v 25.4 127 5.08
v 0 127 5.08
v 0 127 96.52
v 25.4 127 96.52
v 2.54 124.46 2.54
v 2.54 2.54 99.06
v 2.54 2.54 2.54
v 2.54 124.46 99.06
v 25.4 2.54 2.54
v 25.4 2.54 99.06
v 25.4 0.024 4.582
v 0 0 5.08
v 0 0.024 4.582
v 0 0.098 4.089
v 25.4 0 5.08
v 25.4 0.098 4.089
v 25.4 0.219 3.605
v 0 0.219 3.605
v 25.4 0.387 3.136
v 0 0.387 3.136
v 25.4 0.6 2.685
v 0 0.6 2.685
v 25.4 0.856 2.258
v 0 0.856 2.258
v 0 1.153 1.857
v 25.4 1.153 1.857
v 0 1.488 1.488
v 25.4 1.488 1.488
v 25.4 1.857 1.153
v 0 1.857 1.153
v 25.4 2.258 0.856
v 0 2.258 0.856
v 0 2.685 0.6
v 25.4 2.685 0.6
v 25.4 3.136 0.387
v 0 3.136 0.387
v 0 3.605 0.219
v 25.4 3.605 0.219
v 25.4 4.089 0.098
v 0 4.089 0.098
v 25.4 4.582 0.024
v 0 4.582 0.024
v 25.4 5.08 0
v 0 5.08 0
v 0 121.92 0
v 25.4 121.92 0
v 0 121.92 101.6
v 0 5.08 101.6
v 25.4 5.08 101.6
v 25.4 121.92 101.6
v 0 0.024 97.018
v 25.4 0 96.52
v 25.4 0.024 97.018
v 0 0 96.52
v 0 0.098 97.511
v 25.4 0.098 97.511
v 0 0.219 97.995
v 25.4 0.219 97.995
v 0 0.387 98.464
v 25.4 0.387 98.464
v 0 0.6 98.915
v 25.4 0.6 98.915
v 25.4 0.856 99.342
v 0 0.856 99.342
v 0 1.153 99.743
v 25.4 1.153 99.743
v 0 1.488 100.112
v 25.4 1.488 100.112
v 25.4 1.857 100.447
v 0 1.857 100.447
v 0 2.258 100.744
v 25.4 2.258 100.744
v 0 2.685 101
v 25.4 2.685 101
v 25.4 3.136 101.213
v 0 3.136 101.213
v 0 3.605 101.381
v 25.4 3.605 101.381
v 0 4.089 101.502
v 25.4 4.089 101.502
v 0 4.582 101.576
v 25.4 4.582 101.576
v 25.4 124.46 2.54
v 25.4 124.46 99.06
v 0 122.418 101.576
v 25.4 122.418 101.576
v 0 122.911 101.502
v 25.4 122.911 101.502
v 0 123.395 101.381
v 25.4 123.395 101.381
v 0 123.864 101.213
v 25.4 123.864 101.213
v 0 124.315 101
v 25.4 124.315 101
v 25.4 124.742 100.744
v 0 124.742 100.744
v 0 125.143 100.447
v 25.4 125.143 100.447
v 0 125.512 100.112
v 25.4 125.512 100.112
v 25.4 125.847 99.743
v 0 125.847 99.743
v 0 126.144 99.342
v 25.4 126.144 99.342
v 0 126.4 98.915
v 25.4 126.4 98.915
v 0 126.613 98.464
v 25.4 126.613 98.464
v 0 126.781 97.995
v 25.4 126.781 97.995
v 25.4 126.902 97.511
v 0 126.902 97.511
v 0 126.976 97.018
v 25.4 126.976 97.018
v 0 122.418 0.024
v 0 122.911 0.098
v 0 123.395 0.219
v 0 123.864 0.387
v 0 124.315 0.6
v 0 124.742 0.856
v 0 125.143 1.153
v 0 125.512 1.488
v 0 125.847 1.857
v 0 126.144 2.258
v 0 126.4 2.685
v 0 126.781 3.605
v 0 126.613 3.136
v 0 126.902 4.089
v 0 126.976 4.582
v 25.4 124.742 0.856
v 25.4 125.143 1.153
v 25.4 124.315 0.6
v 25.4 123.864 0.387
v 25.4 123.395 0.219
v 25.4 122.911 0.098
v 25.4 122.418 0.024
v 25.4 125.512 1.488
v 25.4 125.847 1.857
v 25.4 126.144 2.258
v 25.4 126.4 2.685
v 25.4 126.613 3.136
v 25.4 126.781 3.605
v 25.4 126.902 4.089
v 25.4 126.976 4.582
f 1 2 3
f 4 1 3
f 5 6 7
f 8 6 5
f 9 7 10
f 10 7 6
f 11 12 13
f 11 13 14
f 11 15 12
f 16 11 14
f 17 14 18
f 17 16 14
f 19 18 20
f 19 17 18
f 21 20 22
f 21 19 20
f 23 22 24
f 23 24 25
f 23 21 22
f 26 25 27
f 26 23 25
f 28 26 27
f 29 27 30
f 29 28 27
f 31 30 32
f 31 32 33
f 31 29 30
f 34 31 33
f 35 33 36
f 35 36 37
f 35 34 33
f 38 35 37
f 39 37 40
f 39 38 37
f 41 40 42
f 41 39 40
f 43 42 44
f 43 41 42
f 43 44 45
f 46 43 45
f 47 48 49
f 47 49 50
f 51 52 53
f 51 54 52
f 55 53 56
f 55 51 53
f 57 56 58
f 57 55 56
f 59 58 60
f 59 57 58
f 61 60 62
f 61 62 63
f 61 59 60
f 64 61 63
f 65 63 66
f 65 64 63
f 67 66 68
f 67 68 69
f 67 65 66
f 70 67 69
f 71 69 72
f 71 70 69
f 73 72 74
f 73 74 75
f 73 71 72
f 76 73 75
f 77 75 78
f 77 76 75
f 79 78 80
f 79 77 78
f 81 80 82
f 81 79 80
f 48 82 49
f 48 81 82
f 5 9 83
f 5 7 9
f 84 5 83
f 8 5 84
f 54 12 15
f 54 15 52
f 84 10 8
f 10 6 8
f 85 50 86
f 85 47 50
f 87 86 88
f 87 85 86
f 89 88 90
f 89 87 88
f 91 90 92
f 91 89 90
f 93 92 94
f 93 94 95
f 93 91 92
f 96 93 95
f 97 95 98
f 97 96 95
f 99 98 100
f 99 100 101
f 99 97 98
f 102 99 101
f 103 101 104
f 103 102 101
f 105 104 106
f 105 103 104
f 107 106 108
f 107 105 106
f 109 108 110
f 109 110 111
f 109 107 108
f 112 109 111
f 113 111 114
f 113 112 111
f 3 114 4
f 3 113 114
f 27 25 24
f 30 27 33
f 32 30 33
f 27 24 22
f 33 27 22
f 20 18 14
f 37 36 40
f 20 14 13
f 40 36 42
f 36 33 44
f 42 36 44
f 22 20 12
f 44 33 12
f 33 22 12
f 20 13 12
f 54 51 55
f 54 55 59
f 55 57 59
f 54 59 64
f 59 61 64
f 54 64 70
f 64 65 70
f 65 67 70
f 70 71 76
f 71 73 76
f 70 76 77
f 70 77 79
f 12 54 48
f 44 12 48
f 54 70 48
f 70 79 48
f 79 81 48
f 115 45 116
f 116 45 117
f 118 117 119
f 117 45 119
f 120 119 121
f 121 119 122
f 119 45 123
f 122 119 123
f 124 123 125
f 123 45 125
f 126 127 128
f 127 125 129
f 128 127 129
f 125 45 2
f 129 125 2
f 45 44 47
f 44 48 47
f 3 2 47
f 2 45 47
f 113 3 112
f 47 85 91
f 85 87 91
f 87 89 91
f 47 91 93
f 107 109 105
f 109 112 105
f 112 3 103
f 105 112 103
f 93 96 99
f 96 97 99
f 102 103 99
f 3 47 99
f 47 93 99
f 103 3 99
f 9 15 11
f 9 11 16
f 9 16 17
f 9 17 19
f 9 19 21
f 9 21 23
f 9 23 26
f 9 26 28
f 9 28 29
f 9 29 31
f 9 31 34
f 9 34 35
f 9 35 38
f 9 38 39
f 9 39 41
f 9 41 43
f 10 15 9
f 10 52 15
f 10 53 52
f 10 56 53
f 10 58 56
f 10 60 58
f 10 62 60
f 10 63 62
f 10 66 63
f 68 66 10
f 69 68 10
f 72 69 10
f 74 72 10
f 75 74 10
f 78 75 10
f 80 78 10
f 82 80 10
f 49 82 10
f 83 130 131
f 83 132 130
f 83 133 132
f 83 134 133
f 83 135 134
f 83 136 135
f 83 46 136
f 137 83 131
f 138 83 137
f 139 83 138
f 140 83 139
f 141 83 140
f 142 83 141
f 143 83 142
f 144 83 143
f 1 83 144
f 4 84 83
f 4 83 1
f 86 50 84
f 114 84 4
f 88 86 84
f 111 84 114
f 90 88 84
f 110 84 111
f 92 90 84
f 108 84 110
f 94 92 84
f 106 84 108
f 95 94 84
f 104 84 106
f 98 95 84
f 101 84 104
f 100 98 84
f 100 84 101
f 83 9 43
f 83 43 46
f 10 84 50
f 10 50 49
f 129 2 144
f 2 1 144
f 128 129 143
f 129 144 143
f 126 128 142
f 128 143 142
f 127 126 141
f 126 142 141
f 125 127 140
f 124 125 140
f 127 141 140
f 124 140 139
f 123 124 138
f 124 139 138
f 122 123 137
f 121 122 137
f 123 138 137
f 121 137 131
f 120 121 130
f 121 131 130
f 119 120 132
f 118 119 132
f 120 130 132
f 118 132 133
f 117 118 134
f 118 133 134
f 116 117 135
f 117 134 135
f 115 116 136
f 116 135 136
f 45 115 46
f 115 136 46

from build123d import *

# Parameters (mm, degrees)
F0_W     = 127
F0_H     = 101.6
F1_DEPTH = 25.4
F2_DEPTH = 6.35
F3_T     = -2.54
F4_R     = 5.08


with BuildPart() as f1:
    # F0 (on Right) → F1 (new body)
    with BuildSketch(Plane.YZ):
        with Locations((63.5, 50.8)):
            Rectangle(F0_W, F0_H)
    extrude(amount=F1_DEPTH)

    # F0 (on Right) → F2 (join)
    with BuildSketch(Plane.YZ):
        with Locations((63.5, 50.8)):
            Rectangle(F0_W, F0_H)
    extrude(amount=F2_DEPTH)

    # F3
    f3_openings = [f1.faces().sort_by_distance(p)[0] for p in [
        (25.4, 63.5, 50.8),
    ]]
    offset(amount=F3_T, openings=f3_openings)

    # F4
    f4_edges = [f1.edges().sort_by_distance(p)[0] for p in [
        (12.7, 0, 101.6),
        (12.7, 0, 0),
        (12.7, 127, 0),
        (12.7, 127, 101.6),
    ]]
    fillet(f4_edges, radius=F4_R)


solid = f1.part
